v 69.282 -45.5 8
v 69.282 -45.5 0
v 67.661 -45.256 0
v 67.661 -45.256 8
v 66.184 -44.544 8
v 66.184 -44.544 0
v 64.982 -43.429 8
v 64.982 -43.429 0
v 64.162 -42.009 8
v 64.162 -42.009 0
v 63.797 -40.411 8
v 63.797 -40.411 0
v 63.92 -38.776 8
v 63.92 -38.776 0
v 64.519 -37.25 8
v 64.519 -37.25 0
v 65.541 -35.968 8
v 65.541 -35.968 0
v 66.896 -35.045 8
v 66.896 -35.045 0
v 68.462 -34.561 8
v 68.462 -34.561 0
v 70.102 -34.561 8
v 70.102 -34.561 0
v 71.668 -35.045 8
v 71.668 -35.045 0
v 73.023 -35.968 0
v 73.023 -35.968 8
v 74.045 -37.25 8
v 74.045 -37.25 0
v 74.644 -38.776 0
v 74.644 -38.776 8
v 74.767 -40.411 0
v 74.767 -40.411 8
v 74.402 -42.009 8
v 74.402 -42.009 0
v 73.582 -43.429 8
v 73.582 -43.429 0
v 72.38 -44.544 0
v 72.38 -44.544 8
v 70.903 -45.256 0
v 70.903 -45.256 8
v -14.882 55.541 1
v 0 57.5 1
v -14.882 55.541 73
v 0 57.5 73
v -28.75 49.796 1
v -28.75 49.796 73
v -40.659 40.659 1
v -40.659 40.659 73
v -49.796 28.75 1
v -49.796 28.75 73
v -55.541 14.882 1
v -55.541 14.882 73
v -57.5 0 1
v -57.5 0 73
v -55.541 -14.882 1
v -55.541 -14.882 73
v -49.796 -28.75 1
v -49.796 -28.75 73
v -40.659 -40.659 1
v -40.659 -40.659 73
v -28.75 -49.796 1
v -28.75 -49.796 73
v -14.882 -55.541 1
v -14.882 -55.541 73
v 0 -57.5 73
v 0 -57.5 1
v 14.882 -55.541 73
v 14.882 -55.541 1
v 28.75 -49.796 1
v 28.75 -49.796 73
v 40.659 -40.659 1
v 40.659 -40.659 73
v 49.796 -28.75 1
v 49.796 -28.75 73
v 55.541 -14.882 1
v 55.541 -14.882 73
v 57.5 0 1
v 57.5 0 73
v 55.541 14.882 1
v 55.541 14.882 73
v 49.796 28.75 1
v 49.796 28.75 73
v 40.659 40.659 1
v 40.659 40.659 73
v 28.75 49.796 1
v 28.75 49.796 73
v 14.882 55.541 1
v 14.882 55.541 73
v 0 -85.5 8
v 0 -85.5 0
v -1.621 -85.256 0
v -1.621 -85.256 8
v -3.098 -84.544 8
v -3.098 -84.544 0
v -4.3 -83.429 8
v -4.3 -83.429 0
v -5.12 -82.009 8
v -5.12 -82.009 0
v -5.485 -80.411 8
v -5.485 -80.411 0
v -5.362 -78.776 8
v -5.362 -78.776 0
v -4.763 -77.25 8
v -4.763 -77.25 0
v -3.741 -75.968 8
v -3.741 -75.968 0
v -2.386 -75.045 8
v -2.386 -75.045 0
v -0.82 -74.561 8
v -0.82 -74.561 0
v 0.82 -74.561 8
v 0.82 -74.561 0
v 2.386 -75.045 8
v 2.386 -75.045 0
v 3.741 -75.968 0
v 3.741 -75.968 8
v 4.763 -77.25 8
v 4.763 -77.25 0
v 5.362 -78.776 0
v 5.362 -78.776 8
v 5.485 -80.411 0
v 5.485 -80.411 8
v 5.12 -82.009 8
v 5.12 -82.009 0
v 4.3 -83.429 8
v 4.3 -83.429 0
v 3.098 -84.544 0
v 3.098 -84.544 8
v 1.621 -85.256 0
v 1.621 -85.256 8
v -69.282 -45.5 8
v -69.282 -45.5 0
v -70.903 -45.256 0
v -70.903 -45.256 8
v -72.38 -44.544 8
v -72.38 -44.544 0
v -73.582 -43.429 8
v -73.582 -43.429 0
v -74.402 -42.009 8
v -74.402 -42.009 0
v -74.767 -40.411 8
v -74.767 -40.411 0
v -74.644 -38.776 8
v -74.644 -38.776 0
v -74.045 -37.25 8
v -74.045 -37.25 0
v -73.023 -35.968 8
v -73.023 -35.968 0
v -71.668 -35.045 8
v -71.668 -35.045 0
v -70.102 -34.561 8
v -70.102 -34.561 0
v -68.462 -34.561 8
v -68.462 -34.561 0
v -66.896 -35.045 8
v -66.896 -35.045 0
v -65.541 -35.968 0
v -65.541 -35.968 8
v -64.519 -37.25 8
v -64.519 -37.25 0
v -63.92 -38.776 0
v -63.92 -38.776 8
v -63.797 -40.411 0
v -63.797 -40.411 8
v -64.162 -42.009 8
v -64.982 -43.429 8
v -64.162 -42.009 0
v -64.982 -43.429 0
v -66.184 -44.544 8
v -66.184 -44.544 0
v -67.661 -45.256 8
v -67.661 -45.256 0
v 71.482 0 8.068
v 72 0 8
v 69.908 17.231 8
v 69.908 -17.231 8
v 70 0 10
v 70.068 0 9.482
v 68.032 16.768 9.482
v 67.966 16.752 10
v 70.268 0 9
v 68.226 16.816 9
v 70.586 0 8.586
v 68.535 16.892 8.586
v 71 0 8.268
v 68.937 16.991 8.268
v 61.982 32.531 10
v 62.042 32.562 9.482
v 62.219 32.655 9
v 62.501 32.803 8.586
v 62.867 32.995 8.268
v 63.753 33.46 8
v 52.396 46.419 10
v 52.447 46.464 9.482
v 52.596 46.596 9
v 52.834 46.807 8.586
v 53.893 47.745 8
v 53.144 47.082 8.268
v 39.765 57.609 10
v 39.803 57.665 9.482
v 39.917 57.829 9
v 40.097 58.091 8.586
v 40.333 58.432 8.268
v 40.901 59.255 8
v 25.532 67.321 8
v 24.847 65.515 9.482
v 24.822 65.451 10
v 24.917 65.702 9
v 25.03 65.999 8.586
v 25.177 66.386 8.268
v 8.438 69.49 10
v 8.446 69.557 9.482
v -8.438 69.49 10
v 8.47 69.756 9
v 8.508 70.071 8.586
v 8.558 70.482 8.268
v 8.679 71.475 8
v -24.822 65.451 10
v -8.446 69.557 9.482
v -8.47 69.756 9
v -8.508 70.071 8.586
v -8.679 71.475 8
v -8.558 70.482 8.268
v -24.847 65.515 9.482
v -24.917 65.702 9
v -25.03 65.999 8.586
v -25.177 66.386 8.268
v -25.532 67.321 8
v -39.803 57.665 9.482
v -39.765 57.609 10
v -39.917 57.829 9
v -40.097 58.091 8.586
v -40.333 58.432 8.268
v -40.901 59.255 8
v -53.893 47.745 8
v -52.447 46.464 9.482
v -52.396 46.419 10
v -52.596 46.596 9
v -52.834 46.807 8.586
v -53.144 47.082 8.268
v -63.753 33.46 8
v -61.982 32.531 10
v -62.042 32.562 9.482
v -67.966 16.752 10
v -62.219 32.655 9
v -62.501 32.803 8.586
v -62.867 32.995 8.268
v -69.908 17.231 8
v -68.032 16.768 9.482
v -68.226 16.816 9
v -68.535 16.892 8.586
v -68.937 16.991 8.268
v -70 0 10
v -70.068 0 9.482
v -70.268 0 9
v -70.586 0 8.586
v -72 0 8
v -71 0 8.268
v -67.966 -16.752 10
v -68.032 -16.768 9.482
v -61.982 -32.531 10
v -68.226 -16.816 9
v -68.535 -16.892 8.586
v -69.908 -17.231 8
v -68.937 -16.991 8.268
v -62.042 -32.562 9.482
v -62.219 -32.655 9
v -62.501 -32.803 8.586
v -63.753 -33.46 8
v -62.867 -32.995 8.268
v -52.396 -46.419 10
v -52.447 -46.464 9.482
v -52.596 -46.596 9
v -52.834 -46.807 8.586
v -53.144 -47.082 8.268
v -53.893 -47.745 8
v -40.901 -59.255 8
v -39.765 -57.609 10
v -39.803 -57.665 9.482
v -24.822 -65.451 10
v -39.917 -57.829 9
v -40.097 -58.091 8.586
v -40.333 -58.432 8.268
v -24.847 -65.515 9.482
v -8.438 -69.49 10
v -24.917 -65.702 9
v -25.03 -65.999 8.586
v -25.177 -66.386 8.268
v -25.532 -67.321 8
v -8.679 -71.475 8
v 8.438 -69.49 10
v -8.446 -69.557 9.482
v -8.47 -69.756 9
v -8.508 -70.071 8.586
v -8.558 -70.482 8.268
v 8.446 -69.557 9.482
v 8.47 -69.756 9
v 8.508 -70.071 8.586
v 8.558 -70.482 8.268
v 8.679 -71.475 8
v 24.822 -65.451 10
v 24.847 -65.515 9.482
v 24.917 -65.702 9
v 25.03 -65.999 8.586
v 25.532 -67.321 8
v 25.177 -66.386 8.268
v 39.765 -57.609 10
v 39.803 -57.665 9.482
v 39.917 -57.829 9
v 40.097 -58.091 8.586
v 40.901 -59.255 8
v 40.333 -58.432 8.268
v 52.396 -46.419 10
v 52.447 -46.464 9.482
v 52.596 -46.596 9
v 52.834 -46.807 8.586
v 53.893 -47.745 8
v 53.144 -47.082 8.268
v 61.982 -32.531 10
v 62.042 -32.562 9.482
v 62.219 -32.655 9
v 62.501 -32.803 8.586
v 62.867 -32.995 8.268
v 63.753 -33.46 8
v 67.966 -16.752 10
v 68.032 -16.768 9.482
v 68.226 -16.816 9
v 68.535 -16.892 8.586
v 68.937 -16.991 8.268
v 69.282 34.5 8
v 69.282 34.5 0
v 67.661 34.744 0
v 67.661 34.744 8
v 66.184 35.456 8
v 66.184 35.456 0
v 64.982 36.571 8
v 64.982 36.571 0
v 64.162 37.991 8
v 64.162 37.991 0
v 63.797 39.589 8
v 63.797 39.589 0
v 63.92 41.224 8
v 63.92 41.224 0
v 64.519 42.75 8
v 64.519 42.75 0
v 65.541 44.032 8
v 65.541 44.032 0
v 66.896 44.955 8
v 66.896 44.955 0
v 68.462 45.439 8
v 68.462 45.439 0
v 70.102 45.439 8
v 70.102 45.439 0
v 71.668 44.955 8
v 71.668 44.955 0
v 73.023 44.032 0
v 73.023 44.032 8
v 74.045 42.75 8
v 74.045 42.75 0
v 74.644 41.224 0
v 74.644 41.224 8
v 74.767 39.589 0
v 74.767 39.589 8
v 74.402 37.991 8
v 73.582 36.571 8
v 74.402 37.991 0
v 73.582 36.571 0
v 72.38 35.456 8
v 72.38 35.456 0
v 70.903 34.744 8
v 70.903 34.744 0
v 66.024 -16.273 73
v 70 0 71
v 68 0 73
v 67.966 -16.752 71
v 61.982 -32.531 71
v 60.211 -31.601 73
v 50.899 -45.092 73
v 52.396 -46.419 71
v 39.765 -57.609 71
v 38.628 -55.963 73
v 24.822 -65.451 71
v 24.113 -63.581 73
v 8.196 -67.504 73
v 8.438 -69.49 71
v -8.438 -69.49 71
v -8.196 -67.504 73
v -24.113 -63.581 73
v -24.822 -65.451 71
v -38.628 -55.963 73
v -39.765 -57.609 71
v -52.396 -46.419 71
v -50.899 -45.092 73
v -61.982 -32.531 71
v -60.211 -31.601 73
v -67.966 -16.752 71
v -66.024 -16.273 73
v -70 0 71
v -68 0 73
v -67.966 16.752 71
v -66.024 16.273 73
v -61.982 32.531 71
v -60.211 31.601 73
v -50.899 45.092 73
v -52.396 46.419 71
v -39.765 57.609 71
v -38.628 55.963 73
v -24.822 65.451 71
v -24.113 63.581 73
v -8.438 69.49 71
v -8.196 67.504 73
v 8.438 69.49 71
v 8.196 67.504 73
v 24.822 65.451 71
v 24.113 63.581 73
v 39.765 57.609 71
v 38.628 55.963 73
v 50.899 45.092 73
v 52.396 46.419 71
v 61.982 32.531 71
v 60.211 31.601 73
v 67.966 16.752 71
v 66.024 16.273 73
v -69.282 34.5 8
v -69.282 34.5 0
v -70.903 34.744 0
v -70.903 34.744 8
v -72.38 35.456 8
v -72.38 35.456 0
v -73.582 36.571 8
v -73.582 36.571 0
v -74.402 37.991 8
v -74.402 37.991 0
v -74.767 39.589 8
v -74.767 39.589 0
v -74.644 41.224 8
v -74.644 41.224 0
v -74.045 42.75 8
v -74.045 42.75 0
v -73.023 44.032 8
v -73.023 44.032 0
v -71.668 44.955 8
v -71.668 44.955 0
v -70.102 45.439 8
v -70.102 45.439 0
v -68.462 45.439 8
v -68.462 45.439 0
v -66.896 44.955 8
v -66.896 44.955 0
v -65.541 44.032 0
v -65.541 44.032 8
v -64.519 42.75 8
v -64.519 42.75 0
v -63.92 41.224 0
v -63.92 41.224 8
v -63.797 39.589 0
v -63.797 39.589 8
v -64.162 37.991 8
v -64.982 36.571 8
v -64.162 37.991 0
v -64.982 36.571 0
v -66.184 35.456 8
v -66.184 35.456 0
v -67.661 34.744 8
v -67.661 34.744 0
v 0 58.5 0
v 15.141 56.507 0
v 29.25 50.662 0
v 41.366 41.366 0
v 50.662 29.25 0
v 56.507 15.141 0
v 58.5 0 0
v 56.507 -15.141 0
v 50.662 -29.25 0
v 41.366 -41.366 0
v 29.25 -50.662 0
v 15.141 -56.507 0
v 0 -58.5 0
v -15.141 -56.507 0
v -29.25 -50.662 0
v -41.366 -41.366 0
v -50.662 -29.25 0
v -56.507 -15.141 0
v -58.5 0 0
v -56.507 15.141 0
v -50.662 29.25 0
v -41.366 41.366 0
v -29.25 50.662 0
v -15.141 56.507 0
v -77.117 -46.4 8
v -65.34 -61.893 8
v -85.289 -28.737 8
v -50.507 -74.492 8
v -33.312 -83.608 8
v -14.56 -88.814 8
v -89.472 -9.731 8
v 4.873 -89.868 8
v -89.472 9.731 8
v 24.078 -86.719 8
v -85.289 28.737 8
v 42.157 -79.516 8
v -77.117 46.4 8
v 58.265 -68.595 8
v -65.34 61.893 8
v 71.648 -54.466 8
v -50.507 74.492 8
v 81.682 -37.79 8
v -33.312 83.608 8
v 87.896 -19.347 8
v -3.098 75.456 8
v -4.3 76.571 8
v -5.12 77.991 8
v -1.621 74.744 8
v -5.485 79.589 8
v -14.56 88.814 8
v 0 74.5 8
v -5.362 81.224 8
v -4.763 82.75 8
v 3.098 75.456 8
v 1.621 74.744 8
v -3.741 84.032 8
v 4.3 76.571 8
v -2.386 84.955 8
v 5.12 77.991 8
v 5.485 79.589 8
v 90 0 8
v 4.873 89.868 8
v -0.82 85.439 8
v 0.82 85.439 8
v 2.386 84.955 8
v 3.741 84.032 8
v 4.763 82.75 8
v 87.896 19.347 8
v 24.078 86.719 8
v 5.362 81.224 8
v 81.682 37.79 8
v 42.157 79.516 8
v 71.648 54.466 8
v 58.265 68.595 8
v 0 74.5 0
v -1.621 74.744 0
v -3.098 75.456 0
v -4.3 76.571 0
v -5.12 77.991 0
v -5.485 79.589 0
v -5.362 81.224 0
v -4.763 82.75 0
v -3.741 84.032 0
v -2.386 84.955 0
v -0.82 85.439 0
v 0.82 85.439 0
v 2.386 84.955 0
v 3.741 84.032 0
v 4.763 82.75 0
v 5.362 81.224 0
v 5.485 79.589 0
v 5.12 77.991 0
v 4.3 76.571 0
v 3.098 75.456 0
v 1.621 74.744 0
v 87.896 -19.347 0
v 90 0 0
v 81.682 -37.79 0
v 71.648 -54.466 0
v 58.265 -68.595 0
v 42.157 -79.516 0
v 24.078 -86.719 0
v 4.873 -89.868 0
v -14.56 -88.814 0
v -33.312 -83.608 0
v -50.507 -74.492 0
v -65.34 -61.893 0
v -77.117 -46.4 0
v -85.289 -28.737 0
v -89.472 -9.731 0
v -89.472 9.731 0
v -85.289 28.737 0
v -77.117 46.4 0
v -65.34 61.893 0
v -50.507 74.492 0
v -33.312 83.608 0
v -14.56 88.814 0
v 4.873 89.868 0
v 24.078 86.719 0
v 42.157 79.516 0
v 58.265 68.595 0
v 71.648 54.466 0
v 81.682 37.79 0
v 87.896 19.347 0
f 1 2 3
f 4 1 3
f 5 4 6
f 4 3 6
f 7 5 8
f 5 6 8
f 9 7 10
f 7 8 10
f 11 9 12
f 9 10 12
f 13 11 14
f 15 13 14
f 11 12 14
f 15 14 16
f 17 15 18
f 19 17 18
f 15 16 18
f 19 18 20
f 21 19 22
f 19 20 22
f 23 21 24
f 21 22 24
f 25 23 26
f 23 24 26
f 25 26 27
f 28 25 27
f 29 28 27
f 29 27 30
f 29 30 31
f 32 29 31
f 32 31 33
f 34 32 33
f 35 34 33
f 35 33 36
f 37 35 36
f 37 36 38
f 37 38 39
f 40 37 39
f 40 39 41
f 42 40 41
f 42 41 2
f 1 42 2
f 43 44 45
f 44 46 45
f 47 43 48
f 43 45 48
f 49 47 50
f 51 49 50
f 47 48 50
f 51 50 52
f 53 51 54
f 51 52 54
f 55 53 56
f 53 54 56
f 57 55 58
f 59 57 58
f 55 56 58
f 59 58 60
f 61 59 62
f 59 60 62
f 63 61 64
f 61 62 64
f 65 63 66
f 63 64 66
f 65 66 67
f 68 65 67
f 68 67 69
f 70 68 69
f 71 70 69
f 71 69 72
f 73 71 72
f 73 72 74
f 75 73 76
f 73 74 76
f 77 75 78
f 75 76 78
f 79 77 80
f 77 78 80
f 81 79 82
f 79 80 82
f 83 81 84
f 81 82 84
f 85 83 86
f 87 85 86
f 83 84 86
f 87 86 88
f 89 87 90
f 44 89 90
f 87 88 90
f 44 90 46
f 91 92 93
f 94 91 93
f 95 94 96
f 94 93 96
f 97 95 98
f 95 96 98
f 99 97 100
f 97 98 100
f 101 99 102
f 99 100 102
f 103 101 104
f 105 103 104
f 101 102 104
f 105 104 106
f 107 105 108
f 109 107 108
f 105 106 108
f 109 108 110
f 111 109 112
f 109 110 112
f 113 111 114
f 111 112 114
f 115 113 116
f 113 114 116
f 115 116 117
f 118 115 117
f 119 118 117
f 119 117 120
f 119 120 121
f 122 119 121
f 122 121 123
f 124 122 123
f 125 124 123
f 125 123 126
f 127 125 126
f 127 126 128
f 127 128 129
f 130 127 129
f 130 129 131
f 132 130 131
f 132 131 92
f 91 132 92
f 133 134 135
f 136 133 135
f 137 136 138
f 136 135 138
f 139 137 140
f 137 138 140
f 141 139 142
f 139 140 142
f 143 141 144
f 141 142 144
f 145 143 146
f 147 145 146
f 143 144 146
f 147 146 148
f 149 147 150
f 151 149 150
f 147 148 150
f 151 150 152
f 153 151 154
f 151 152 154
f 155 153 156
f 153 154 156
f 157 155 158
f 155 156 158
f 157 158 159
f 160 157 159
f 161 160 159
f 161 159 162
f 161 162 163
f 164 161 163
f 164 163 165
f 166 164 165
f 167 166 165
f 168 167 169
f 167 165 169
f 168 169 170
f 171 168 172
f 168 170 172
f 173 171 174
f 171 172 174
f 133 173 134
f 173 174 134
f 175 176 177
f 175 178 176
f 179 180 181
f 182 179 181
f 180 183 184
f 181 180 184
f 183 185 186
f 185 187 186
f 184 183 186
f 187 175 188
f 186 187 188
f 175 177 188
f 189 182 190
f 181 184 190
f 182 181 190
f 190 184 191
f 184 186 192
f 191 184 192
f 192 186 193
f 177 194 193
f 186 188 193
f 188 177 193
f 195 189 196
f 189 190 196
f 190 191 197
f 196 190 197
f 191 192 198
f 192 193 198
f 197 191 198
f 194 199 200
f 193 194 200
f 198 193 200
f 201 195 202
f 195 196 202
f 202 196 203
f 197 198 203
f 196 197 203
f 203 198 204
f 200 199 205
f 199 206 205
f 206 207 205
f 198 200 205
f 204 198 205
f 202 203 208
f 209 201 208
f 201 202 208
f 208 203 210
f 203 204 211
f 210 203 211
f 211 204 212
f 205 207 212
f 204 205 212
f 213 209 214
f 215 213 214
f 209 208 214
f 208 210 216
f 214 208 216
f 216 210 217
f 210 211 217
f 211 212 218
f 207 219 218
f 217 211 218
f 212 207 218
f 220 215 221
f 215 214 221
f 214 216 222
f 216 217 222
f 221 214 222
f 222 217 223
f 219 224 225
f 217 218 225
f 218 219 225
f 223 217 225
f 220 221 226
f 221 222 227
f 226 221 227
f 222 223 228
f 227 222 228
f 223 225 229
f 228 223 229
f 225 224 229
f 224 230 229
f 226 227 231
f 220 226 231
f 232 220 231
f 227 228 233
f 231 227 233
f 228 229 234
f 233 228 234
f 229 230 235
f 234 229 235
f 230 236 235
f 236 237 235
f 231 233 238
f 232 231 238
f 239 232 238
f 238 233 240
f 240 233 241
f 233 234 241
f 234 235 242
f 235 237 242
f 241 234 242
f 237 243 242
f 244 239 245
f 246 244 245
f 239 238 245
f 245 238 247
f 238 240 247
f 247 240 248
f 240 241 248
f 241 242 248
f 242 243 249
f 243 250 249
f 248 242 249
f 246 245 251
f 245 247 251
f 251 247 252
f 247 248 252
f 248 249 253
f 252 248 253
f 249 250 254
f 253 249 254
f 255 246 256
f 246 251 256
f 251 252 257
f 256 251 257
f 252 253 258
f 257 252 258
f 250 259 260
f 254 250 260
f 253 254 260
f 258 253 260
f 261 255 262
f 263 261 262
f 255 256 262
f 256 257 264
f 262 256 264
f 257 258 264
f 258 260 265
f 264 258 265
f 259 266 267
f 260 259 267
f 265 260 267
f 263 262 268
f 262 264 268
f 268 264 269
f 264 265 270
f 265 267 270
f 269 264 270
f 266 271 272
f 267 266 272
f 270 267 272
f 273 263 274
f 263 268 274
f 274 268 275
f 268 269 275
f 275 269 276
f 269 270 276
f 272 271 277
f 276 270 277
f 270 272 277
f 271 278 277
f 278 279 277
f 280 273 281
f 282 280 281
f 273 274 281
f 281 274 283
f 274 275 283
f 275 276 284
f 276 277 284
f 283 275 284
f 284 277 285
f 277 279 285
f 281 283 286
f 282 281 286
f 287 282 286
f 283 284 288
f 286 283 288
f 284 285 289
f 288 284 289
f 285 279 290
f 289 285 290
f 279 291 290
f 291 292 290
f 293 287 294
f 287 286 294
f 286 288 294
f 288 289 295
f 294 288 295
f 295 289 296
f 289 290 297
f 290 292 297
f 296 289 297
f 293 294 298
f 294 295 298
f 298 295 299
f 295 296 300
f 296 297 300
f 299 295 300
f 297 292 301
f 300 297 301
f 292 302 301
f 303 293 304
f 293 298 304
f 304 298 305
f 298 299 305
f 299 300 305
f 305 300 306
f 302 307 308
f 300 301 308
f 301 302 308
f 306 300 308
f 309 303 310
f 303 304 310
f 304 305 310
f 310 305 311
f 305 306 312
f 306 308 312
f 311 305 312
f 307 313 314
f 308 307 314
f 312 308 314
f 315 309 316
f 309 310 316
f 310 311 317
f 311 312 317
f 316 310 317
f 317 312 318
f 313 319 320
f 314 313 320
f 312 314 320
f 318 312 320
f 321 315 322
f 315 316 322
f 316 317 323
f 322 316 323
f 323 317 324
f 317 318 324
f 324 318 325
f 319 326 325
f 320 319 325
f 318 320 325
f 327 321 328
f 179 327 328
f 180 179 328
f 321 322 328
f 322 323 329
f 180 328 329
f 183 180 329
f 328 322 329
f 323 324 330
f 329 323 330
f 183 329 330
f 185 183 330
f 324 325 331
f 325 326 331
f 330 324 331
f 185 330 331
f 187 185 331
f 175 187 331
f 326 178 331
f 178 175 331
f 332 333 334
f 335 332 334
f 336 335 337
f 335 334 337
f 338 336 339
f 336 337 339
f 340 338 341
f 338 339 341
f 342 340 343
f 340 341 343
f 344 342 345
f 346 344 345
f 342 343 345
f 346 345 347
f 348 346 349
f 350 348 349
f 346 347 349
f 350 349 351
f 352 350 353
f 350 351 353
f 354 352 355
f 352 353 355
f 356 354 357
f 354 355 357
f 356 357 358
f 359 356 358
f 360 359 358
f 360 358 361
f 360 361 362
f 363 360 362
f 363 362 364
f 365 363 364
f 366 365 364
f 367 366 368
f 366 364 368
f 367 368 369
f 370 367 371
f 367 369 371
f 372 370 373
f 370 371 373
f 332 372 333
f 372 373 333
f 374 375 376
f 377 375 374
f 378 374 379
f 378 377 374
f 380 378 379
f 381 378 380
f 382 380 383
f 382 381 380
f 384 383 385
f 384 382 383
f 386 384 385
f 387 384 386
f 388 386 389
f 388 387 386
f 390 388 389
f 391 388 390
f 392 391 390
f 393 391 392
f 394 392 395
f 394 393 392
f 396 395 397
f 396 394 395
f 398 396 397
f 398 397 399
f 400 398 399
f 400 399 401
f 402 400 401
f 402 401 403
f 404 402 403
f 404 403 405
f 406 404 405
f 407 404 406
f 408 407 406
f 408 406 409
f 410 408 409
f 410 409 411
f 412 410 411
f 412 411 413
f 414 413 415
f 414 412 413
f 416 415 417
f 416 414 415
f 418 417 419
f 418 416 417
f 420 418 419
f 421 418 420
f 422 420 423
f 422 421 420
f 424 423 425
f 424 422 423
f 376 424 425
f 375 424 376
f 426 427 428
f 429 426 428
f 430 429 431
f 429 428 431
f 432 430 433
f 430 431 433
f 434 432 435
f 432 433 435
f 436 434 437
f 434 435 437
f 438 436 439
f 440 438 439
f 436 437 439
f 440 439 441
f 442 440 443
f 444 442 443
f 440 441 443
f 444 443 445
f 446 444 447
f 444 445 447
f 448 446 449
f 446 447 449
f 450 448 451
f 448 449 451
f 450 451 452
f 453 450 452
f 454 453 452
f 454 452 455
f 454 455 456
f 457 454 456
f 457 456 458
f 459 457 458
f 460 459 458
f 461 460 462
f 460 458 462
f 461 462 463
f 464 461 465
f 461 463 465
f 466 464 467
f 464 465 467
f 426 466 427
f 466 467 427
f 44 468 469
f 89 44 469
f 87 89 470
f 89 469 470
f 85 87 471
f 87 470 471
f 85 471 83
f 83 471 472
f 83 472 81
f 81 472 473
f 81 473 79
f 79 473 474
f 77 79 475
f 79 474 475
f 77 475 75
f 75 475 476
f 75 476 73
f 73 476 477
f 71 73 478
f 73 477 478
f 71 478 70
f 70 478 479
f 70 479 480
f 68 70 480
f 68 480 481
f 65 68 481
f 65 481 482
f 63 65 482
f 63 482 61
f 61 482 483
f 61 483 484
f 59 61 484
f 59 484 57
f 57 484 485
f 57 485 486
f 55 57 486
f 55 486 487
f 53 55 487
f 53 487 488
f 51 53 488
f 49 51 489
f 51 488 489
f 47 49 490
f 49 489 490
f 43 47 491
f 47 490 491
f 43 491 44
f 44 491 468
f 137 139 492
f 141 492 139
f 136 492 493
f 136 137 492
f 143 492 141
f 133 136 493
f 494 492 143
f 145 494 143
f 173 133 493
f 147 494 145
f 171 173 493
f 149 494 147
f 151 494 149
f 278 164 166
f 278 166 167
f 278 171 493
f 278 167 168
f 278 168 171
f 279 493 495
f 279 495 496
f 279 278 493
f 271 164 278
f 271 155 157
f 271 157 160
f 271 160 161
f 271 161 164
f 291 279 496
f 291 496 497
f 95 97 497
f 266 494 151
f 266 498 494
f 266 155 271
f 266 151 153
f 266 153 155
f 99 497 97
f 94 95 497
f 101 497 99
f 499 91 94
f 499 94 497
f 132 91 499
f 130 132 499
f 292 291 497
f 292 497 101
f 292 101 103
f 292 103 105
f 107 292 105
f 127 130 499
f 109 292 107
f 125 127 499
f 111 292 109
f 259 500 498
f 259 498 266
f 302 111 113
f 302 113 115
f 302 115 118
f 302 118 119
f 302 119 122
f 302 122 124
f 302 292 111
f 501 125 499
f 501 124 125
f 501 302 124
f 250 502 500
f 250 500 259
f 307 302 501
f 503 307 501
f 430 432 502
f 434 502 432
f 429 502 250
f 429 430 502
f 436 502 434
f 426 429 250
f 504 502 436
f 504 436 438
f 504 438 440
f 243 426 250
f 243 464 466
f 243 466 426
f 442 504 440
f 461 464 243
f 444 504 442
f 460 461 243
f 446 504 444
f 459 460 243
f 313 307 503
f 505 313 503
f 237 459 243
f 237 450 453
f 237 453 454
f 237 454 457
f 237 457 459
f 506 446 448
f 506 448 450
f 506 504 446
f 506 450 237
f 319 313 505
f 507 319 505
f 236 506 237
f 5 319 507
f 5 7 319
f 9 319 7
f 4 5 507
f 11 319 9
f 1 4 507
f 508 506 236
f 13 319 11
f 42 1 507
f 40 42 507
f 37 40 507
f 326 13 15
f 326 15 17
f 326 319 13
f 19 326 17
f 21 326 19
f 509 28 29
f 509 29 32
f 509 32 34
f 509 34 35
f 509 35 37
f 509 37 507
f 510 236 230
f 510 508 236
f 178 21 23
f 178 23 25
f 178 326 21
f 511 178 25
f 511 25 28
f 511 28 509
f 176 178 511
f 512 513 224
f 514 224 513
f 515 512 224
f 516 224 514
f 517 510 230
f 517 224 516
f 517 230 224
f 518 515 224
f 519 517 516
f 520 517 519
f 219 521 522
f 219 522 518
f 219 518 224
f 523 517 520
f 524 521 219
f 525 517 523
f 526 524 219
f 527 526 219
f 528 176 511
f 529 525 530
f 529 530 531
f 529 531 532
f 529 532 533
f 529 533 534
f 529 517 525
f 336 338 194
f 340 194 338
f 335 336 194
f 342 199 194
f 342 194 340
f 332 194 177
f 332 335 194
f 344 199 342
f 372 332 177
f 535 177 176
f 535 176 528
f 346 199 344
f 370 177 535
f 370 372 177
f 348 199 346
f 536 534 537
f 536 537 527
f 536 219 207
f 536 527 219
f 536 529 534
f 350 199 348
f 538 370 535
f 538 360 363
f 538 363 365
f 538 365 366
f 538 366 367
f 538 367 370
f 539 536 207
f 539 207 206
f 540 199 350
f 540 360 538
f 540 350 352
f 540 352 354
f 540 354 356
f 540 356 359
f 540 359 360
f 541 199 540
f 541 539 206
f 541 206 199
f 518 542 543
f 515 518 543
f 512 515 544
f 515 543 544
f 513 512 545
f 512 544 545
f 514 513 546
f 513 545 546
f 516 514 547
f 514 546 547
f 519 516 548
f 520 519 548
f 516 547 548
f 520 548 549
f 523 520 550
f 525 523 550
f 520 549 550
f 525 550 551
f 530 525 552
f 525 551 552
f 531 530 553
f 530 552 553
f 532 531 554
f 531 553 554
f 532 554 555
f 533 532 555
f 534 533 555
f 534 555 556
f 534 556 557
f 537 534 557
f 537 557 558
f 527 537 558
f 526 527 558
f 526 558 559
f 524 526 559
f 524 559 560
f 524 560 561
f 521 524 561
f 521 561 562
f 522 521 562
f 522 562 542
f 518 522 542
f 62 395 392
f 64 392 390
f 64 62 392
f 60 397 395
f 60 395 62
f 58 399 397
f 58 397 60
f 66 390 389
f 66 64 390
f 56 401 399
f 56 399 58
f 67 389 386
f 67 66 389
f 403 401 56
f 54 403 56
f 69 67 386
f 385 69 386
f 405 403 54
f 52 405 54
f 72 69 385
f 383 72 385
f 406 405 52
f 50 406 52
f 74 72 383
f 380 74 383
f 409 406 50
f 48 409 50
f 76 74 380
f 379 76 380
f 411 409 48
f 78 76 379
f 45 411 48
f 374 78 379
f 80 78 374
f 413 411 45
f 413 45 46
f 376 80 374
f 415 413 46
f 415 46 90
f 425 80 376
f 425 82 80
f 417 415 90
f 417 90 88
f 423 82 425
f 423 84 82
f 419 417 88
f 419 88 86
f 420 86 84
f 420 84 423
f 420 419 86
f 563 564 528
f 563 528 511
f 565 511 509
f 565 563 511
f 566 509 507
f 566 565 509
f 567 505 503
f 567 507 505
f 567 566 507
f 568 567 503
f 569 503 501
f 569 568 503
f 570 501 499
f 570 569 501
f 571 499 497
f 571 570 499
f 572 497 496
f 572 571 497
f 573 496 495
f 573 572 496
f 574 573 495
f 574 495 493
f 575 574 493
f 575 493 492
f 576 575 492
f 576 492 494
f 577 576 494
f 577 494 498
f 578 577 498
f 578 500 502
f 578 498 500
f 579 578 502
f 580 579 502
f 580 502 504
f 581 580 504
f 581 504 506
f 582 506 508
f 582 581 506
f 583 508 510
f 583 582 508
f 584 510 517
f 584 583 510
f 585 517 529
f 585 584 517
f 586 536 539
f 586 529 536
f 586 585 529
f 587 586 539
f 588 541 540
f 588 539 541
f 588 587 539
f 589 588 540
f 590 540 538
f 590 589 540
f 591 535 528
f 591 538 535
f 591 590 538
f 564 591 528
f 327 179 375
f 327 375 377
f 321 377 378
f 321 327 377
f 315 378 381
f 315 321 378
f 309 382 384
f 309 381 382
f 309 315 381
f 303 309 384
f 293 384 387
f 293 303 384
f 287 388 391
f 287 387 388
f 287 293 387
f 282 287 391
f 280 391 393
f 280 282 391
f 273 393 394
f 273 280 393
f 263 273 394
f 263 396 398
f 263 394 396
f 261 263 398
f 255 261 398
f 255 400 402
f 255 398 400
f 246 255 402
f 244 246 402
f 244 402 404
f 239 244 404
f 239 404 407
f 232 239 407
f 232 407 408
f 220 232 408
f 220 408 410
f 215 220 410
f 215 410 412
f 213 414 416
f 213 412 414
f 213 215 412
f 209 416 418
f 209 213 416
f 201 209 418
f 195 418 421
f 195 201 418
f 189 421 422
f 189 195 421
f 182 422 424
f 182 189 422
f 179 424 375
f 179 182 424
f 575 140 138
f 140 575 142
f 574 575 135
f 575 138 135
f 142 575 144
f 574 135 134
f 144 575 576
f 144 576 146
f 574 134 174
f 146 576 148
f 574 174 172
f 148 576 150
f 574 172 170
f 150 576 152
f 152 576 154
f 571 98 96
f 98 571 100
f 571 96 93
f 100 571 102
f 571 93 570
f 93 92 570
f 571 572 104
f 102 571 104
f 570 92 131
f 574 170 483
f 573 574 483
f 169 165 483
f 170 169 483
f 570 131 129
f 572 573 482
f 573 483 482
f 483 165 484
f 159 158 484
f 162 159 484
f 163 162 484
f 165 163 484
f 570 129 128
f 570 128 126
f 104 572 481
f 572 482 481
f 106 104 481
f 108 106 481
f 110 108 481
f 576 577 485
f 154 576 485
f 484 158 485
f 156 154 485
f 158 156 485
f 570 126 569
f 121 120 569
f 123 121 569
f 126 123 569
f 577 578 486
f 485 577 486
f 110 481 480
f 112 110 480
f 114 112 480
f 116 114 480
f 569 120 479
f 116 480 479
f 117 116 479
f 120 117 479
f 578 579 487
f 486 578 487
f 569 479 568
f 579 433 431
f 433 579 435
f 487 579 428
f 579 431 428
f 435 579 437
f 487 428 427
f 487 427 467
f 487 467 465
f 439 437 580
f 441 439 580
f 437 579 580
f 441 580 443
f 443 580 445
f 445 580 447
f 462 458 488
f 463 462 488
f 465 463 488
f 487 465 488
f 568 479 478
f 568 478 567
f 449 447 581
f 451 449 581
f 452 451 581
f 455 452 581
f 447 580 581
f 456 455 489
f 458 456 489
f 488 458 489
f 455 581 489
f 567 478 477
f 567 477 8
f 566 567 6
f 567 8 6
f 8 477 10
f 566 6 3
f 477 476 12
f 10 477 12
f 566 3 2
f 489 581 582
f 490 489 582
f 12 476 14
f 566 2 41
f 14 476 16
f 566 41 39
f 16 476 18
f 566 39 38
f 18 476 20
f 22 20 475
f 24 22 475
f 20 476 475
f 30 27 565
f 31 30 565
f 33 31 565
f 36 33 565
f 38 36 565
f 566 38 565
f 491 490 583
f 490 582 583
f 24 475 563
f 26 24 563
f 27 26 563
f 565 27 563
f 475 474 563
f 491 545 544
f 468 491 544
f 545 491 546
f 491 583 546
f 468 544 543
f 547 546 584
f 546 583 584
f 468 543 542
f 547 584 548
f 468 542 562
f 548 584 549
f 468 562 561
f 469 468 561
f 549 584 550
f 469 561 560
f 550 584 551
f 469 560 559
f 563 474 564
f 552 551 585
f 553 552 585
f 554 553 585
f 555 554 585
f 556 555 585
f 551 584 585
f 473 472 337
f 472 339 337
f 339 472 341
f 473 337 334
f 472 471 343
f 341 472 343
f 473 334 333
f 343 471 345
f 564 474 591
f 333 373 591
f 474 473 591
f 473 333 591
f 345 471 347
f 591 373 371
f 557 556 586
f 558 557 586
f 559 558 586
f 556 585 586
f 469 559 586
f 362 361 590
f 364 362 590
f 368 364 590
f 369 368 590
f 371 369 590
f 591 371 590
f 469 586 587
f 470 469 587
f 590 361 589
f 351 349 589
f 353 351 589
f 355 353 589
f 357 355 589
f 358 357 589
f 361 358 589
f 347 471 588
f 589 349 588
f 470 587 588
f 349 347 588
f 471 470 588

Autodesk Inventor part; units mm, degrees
ref_plane "YZ Plane" through (0, 0, 0) normal (1, 0, 0) x (0, 1, 0)
ref_plane "XZ Plane" through (0, 0, 0) normal (0, 1, 0) x (-1, 0, 0)
ref_plane "XY Plane" through (0, 0, 0) normal (0, 0, 1) x (1, 0, 0)
sketch "Эскиз1" plane through (0, 0, 0) normal (0, 0, 1) x (1, 0, 0)
  circle A0 centre (0, 0) radius 90
  dimension "d0" = 180
extrude "Выдавливание1" add sketch "Эскиз1" along normal blind 8
sketch "Эскиз2" plane through (0, 0, 8) normal (0, 0, 1) x (1, 0, 0)
  point P0 (0, 0)
sketch "Эскиз3" plane through (0, 0, 0) normal (0, 0, -1) x (-1, 0, 0)
  circle A0 centre (0, 0) radius 57.5
  dimension "d3" = 115
sketch "Эскиз4" plane through (0, 0, 8) normal (0, 0, 1) x (1, 0, 0)
  circle A0 centre (0, 0) radius 70
  dimension "d4" = 140
extrude "Выдавливание2" add sketch "Эскиз4" along normal blind 65
hole "Отверстие1" at (0, 0, 0) direction (0, 0, 1) diameter 115 end through all
chamfer "Фаска1" distance 2 angle 45 1 edges at (-70, 0, 73)
chamfer "Фаска2" distance 1 angle 45 1 edges at (0, -57.5, 0)
fillet "Сопряжение1" radius 2 1 edges at (-70, 0, 8)
sketch "Эскиз5" plane through (0, 0, 8) normal (0, 0, 1) x (1, 0, 0)
  circle A0 centre (0, 0) radius 80
  circle A1 centre (0, 0) radius 80
  circle A2 centre (0, 0) radius 80
  circle A3 centre (0, 0) radius 80
  circle A4 centre (0, 0) radius 80
  circle A5 centre (0, 0) radius 80
  point P0 (0, 80)
  point P1 (-69.282, 40)
  point P2 (-69.282, -40)
  point P3 (0, -80)
  point P4 (69.282, -40)
  point P5 (69.282, 40)
  dimension "d21" = 160
  dimension "d24" = 360
hole "Отверстие2" at (69.282, 40, 8) at (69.282, -40, 8) at (0, -80, 8) at (-69.282, -40, 8) at (-69.282, 40, 8) at (0, 80, 8) direction (0, 0, -1) diameter 11 end through all
